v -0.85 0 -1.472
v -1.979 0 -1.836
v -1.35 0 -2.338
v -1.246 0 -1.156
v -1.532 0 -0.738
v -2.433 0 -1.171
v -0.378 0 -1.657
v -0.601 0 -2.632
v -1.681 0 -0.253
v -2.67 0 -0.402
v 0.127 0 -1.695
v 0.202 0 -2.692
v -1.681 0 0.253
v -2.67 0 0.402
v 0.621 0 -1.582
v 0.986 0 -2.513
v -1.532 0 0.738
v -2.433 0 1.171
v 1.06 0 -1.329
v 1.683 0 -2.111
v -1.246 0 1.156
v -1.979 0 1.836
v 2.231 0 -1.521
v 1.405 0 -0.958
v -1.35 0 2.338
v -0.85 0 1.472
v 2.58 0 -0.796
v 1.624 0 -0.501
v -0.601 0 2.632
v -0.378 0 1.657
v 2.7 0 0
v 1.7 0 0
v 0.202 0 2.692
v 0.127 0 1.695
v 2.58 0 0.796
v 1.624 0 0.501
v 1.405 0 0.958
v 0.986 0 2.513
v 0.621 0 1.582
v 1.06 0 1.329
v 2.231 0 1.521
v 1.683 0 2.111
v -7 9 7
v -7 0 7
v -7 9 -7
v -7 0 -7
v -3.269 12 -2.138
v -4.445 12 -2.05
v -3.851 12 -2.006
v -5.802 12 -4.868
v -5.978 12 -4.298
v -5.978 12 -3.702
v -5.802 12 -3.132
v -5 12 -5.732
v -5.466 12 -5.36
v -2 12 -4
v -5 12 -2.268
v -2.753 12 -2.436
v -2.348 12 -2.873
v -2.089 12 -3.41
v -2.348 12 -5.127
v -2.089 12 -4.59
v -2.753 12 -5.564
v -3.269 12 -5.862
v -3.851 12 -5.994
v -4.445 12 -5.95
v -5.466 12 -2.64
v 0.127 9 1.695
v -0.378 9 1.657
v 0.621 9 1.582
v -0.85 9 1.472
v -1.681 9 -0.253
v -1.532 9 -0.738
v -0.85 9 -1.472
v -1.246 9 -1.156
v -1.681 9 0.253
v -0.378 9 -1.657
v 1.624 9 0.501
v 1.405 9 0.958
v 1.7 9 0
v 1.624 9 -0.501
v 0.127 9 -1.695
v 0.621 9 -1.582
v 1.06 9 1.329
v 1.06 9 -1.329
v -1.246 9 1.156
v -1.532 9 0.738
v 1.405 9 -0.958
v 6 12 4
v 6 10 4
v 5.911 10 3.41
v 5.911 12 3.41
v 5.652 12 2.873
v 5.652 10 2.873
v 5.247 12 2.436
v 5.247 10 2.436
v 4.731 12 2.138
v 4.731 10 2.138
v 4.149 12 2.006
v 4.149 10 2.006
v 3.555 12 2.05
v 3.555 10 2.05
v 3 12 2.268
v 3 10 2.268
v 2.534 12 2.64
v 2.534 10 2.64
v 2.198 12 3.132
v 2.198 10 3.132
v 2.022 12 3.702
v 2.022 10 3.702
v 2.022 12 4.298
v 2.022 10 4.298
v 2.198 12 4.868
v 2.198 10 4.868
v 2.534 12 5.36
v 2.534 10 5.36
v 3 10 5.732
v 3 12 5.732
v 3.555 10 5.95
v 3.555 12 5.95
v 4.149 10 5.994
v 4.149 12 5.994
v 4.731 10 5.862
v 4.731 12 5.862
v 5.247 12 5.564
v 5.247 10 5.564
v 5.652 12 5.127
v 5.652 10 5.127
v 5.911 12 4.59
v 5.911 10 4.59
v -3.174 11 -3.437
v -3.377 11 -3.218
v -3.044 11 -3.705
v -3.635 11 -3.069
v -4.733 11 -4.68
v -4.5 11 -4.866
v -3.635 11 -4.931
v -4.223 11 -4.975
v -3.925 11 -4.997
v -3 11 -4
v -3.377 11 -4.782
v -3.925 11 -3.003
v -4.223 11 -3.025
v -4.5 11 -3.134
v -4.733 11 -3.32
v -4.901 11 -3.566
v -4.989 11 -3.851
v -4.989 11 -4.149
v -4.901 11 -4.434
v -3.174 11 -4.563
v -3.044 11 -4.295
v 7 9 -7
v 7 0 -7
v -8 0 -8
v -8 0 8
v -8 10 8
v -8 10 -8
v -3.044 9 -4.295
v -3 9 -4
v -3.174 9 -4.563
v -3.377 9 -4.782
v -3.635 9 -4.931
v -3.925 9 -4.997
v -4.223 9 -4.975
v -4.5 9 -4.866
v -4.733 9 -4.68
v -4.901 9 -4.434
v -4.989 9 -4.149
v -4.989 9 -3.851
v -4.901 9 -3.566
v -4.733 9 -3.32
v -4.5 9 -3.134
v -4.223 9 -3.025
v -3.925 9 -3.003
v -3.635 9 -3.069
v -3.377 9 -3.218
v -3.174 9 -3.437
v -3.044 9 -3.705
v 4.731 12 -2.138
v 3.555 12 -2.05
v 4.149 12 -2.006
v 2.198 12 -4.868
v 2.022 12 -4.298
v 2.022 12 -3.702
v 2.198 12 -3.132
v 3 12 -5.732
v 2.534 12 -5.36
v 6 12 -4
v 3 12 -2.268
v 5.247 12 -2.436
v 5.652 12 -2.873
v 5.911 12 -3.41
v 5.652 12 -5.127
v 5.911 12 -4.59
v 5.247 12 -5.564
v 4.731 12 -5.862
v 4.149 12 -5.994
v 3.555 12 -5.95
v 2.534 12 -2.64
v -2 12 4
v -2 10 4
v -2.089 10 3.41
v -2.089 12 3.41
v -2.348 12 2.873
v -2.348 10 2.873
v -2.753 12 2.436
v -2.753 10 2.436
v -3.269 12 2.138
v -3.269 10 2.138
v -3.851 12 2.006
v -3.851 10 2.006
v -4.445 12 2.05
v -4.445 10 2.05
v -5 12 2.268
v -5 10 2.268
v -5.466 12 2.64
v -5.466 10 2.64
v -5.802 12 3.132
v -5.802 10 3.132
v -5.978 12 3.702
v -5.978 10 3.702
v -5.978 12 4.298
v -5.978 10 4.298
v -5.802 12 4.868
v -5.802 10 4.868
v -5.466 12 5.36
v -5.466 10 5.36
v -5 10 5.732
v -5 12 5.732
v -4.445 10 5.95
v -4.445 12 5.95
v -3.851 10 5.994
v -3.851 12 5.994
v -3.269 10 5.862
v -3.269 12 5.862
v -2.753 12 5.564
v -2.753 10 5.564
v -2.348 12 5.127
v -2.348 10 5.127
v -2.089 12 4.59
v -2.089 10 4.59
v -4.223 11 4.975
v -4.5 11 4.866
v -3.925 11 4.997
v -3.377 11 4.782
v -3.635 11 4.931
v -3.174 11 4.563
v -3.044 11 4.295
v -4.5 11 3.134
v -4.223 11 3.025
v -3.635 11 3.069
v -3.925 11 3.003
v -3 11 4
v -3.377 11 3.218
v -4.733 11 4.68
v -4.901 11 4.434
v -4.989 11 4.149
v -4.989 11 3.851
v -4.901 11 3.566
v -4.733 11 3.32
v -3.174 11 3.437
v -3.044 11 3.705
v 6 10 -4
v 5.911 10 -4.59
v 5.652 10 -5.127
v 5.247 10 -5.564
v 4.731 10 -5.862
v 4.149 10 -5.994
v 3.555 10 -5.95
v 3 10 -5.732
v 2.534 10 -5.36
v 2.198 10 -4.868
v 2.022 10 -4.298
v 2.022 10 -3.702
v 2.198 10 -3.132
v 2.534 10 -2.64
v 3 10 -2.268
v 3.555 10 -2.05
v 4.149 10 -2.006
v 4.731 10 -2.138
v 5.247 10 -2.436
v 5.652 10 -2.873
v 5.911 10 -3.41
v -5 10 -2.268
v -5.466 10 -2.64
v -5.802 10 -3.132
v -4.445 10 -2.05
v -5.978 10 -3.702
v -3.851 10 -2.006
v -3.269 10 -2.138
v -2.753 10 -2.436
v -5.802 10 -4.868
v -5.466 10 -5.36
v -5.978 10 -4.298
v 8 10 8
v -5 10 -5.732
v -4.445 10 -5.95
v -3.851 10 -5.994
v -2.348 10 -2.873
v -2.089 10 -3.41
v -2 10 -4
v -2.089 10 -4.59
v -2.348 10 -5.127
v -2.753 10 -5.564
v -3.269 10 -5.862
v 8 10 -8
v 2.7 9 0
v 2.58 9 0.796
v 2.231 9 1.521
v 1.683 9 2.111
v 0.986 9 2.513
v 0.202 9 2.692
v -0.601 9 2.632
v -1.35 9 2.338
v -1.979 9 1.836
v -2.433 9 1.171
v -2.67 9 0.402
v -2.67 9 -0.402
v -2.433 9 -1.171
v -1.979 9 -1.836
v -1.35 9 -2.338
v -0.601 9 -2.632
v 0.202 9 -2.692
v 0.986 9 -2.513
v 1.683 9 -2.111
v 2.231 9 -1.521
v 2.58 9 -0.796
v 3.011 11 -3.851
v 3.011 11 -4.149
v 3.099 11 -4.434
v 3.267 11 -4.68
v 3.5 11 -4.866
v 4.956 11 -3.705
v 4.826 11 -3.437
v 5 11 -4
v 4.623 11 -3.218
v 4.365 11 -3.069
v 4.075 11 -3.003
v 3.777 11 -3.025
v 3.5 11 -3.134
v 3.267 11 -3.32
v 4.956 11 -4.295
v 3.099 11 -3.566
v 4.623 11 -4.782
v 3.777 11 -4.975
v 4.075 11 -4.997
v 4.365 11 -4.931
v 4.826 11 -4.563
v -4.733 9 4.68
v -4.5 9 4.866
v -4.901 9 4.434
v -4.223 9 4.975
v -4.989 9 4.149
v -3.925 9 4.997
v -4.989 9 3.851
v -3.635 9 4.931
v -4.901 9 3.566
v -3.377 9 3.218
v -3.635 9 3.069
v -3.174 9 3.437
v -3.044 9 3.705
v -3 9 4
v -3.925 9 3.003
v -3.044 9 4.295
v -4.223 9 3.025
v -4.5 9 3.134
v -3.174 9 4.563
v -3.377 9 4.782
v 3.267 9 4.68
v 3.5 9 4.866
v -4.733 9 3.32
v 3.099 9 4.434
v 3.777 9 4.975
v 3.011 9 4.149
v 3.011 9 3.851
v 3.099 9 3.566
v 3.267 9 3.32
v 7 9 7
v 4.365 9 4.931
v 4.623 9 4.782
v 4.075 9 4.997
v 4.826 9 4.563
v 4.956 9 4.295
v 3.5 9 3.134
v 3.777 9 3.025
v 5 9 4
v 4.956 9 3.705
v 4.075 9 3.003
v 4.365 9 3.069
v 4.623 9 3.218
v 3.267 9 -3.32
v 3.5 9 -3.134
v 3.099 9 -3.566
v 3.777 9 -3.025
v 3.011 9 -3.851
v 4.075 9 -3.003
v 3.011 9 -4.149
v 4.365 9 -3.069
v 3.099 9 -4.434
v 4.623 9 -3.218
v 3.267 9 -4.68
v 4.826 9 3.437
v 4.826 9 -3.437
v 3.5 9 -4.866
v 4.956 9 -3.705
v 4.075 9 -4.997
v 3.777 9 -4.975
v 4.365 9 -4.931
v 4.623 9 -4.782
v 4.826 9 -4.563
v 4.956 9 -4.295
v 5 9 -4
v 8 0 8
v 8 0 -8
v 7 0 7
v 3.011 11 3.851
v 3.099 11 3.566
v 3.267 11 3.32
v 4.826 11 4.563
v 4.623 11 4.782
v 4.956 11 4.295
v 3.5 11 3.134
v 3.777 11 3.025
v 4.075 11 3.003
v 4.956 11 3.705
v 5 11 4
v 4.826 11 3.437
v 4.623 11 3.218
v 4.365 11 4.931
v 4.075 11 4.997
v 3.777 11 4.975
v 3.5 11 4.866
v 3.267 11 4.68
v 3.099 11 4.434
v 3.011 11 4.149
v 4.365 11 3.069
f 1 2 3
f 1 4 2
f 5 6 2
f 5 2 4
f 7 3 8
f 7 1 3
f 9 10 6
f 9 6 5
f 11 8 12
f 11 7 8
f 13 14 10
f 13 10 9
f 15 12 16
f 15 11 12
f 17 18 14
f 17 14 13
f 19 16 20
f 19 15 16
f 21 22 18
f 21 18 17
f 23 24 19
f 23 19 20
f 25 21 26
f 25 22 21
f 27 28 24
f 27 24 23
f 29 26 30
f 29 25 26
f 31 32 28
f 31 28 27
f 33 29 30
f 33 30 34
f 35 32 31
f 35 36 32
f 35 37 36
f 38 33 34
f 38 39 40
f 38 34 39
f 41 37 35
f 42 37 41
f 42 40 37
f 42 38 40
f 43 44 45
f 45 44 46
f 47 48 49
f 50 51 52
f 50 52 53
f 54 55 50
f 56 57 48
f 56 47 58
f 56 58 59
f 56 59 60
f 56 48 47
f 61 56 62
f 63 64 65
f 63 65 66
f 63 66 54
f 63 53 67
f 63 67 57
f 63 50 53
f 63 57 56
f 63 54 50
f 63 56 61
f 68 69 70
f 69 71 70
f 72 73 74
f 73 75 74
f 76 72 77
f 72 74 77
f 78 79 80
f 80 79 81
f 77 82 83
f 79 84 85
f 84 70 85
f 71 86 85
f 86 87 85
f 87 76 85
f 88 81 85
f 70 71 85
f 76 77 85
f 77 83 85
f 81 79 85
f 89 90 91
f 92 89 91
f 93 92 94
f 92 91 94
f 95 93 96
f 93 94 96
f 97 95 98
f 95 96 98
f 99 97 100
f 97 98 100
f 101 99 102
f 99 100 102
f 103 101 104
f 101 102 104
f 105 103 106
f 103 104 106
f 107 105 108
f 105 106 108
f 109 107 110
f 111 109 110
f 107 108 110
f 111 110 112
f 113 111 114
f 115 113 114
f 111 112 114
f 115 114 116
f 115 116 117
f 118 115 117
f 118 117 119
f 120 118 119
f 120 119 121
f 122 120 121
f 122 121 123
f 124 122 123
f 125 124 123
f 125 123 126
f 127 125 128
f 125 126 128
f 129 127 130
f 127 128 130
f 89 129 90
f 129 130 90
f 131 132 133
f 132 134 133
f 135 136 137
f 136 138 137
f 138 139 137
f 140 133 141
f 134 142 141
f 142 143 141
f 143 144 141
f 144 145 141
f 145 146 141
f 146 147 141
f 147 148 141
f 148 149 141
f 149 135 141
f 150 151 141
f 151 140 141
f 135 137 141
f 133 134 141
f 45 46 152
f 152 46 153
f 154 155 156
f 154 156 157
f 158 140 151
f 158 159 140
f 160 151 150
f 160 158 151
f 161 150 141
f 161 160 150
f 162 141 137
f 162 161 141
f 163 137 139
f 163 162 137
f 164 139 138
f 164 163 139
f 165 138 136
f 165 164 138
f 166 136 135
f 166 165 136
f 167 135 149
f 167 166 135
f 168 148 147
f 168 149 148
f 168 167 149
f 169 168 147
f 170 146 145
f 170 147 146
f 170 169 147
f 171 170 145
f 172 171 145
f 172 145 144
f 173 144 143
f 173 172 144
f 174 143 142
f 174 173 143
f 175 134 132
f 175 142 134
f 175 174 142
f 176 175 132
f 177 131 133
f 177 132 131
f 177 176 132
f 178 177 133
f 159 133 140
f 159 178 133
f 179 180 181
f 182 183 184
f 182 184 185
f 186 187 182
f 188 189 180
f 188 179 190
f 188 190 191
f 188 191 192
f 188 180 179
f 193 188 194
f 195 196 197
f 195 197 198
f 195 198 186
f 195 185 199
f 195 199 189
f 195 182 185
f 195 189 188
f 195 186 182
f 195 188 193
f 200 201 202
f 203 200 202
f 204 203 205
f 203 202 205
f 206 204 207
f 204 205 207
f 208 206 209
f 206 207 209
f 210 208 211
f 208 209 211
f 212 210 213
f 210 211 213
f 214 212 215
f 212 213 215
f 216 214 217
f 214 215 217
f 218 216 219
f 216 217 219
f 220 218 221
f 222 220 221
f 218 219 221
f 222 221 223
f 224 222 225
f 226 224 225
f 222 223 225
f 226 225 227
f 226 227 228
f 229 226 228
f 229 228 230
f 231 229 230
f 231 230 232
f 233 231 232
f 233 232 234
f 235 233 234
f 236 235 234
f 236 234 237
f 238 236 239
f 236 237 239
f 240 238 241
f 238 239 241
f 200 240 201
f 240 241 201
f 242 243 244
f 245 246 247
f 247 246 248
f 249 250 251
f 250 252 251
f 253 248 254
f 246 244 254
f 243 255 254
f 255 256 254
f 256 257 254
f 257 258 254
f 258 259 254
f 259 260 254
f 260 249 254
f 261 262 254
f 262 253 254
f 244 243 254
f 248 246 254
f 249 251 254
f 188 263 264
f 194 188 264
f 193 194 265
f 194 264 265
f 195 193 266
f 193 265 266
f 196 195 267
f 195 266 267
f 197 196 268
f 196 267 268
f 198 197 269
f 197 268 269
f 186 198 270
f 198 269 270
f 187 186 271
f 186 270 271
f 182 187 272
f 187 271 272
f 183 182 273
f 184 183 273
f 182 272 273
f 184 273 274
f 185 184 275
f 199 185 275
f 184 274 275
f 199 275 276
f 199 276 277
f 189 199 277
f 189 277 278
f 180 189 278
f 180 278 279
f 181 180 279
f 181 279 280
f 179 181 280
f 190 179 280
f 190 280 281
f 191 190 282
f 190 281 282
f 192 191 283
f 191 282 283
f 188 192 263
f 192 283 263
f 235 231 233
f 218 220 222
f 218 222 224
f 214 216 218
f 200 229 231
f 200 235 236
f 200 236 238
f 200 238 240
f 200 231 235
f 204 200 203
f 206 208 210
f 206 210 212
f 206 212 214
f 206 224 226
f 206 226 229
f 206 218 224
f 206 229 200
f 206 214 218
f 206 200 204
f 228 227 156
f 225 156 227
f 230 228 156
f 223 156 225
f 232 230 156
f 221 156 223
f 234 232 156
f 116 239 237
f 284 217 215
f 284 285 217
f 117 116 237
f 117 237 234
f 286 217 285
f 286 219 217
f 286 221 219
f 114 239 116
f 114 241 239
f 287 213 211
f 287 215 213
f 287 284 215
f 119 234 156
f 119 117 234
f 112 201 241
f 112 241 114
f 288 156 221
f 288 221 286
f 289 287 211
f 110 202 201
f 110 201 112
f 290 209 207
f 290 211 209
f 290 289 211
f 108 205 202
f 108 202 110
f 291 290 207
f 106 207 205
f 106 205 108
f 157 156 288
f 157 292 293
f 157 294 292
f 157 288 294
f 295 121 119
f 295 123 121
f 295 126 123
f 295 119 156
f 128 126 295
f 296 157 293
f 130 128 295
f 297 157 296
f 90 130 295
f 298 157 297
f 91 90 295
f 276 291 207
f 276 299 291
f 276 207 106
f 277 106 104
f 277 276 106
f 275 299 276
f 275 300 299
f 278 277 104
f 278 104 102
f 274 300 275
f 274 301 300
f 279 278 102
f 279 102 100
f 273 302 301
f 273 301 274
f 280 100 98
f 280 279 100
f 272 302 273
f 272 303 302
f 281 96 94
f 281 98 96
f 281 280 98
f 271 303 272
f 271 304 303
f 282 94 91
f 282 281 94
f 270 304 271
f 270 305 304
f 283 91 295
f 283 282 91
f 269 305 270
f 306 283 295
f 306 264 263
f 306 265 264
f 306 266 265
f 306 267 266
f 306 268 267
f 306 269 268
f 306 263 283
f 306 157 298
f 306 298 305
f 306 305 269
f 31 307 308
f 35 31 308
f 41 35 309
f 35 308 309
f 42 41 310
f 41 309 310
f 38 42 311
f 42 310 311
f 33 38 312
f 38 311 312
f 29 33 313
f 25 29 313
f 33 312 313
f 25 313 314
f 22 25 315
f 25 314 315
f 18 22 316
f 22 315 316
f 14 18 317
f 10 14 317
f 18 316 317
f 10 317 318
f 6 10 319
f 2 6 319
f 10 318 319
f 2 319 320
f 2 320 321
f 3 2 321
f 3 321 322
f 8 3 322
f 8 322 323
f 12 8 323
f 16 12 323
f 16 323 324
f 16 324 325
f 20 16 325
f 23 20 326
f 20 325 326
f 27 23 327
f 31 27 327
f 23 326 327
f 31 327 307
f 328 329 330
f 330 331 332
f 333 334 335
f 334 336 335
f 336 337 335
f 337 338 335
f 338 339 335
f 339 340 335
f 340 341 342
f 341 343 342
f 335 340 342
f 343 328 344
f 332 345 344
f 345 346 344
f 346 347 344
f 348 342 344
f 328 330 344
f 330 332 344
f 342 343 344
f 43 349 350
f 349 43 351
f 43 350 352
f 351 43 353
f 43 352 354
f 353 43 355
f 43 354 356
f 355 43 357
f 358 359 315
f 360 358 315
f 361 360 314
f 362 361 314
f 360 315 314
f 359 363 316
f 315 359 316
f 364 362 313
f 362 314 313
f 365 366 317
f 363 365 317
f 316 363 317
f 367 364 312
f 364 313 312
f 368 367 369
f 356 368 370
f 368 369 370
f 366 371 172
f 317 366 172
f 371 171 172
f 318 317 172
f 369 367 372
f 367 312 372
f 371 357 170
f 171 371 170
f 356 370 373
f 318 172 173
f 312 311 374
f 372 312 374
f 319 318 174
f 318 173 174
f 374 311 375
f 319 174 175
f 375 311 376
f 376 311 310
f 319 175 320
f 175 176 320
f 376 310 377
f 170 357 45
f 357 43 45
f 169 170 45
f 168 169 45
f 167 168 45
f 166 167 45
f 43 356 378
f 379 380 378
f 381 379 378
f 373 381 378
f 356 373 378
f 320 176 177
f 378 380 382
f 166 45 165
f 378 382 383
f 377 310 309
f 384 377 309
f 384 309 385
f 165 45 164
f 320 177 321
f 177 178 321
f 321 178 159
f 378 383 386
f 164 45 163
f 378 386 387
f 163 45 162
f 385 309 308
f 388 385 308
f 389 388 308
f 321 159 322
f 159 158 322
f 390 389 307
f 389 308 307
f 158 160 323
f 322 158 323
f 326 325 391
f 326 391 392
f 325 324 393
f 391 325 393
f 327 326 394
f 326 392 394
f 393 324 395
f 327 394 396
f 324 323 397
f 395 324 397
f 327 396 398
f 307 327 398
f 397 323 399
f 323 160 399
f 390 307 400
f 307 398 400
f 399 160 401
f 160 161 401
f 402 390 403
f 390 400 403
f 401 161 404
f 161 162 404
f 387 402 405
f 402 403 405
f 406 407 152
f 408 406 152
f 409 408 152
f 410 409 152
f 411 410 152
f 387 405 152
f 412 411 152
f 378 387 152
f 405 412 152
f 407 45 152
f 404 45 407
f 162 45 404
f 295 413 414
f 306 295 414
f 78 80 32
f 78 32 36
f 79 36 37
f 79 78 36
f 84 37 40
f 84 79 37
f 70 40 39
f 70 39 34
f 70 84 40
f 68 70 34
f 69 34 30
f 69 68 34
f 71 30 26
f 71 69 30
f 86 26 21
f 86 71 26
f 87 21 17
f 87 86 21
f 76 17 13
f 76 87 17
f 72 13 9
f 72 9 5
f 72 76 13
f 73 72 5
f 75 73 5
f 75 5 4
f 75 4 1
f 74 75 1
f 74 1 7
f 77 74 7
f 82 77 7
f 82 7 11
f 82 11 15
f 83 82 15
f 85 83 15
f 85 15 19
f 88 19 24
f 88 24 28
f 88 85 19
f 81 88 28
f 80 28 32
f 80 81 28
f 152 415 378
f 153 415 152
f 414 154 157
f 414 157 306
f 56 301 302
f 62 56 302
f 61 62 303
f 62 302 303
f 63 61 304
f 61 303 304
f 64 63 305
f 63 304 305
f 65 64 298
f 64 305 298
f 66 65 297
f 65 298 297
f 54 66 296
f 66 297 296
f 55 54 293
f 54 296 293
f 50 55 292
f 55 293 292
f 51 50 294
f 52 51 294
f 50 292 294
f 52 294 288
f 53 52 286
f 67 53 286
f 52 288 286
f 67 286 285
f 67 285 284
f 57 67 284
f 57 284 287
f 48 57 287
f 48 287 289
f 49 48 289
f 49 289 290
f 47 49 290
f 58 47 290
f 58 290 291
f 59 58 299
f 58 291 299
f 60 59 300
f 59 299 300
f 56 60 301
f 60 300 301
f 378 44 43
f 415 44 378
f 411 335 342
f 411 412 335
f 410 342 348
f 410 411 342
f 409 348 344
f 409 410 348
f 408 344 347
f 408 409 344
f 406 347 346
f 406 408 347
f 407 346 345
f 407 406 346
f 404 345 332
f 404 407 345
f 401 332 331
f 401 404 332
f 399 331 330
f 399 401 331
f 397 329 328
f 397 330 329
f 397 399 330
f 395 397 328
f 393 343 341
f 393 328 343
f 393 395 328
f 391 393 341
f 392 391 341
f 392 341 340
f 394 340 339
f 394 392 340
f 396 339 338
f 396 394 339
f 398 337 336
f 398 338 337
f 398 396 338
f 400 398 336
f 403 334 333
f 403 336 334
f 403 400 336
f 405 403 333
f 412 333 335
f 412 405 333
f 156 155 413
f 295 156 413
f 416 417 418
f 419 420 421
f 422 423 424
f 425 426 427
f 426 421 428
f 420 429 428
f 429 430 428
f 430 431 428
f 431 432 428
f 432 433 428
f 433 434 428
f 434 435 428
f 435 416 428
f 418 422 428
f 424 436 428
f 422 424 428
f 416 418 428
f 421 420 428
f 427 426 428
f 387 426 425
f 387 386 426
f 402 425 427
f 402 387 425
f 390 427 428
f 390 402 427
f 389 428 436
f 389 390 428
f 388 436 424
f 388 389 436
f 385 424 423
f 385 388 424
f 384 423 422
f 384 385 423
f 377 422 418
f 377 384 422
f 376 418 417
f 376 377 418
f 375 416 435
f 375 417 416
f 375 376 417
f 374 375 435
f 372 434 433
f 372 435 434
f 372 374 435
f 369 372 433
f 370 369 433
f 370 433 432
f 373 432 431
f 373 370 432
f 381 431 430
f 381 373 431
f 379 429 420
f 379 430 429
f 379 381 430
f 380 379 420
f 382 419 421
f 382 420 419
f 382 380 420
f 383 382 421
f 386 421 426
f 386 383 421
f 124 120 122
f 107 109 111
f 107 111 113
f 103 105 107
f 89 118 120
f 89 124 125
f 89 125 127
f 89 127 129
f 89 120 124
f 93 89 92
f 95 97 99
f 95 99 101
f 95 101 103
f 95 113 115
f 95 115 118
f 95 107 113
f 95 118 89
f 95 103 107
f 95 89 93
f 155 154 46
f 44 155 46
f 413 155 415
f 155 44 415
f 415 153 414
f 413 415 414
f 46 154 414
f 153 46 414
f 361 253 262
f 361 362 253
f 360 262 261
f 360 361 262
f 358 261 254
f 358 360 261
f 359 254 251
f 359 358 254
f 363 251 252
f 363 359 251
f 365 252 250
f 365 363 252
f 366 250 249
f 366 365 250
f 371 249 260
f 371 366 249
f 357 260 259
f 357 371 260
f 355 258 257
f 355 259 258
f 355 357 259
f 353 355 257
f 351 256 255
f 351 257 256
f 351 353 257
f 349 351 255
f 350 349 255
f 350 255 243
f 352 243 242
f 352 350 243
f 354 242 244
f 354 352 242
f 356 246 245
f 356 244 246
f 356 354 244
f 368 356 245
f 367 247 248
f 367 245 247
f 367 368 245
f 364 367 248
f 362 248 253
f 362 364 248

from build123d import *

# Parameters (mm, degrees)
SKETCH1_W           = 16
SKETCH1_H           = 16
BOSS_EXTRUDE1_DEPTH = 10
SKETCH2_R           = 2
BOSS_EXTRUDE2_DEPTH = 2
SHELL1_T            = -1
SKETCH3_R           = 2.7
SKETCH3_R_2         = 1.7
BOSS_EXTRUDE3_DEPTH = 9


with BuildPart() as part:
    # Sketch1 → Boss-Extrude1 (new body)
    with BuildSketch(Plane(origin=(0, 0, 0), x_dir=(1, 0, 0), z_dir=(0, 1, 0))):
        Rectangle(SKETCH1_W, SKETCH1_H)
    extrude(amount=BOSS_EXTRUDE1_DEPTH)

    # Sketch2 → Boss-Extrude2 (add)
    with BuildSketch(Plane(origin=(0, 10, 0), x_dir=(1, 0, 0), z_dir=(0, 1, 0))):
        with Locations((-4, 4)):
            Circle(SKETCH2_R)
        with Locations((4, 4)):
            Circle(SKETCH2_R)
        with Locations((-4, -4)):
            Circle(SKETCH2_R)
        with Locations((4, -4)):
            Circle(SKETCH2_R)
    extrude(amount=BOSS_EXTRUDE2_DEPTH)

    # Shell1
    shell1_openings = [part.faces().sort_by_distance(p)[0] for p in [
        (0, 0, 0),
    ]]
    offset(amount=SHELL1_T, openings=shell1_openings, kind=Kind.INTERSECTION)

    # Sketch3 → Boss-Extrude3 (add)
    with BuildSketch(Plane.XZ.offset(-9)):
        Circle(SKETCH3_R)
        Circle(SKETCH3_R_2, mode=Mode.SUBTRACT)
    extrude(amount=BOSS_EXTRUDE3_DEPTH)


solid = part.part
